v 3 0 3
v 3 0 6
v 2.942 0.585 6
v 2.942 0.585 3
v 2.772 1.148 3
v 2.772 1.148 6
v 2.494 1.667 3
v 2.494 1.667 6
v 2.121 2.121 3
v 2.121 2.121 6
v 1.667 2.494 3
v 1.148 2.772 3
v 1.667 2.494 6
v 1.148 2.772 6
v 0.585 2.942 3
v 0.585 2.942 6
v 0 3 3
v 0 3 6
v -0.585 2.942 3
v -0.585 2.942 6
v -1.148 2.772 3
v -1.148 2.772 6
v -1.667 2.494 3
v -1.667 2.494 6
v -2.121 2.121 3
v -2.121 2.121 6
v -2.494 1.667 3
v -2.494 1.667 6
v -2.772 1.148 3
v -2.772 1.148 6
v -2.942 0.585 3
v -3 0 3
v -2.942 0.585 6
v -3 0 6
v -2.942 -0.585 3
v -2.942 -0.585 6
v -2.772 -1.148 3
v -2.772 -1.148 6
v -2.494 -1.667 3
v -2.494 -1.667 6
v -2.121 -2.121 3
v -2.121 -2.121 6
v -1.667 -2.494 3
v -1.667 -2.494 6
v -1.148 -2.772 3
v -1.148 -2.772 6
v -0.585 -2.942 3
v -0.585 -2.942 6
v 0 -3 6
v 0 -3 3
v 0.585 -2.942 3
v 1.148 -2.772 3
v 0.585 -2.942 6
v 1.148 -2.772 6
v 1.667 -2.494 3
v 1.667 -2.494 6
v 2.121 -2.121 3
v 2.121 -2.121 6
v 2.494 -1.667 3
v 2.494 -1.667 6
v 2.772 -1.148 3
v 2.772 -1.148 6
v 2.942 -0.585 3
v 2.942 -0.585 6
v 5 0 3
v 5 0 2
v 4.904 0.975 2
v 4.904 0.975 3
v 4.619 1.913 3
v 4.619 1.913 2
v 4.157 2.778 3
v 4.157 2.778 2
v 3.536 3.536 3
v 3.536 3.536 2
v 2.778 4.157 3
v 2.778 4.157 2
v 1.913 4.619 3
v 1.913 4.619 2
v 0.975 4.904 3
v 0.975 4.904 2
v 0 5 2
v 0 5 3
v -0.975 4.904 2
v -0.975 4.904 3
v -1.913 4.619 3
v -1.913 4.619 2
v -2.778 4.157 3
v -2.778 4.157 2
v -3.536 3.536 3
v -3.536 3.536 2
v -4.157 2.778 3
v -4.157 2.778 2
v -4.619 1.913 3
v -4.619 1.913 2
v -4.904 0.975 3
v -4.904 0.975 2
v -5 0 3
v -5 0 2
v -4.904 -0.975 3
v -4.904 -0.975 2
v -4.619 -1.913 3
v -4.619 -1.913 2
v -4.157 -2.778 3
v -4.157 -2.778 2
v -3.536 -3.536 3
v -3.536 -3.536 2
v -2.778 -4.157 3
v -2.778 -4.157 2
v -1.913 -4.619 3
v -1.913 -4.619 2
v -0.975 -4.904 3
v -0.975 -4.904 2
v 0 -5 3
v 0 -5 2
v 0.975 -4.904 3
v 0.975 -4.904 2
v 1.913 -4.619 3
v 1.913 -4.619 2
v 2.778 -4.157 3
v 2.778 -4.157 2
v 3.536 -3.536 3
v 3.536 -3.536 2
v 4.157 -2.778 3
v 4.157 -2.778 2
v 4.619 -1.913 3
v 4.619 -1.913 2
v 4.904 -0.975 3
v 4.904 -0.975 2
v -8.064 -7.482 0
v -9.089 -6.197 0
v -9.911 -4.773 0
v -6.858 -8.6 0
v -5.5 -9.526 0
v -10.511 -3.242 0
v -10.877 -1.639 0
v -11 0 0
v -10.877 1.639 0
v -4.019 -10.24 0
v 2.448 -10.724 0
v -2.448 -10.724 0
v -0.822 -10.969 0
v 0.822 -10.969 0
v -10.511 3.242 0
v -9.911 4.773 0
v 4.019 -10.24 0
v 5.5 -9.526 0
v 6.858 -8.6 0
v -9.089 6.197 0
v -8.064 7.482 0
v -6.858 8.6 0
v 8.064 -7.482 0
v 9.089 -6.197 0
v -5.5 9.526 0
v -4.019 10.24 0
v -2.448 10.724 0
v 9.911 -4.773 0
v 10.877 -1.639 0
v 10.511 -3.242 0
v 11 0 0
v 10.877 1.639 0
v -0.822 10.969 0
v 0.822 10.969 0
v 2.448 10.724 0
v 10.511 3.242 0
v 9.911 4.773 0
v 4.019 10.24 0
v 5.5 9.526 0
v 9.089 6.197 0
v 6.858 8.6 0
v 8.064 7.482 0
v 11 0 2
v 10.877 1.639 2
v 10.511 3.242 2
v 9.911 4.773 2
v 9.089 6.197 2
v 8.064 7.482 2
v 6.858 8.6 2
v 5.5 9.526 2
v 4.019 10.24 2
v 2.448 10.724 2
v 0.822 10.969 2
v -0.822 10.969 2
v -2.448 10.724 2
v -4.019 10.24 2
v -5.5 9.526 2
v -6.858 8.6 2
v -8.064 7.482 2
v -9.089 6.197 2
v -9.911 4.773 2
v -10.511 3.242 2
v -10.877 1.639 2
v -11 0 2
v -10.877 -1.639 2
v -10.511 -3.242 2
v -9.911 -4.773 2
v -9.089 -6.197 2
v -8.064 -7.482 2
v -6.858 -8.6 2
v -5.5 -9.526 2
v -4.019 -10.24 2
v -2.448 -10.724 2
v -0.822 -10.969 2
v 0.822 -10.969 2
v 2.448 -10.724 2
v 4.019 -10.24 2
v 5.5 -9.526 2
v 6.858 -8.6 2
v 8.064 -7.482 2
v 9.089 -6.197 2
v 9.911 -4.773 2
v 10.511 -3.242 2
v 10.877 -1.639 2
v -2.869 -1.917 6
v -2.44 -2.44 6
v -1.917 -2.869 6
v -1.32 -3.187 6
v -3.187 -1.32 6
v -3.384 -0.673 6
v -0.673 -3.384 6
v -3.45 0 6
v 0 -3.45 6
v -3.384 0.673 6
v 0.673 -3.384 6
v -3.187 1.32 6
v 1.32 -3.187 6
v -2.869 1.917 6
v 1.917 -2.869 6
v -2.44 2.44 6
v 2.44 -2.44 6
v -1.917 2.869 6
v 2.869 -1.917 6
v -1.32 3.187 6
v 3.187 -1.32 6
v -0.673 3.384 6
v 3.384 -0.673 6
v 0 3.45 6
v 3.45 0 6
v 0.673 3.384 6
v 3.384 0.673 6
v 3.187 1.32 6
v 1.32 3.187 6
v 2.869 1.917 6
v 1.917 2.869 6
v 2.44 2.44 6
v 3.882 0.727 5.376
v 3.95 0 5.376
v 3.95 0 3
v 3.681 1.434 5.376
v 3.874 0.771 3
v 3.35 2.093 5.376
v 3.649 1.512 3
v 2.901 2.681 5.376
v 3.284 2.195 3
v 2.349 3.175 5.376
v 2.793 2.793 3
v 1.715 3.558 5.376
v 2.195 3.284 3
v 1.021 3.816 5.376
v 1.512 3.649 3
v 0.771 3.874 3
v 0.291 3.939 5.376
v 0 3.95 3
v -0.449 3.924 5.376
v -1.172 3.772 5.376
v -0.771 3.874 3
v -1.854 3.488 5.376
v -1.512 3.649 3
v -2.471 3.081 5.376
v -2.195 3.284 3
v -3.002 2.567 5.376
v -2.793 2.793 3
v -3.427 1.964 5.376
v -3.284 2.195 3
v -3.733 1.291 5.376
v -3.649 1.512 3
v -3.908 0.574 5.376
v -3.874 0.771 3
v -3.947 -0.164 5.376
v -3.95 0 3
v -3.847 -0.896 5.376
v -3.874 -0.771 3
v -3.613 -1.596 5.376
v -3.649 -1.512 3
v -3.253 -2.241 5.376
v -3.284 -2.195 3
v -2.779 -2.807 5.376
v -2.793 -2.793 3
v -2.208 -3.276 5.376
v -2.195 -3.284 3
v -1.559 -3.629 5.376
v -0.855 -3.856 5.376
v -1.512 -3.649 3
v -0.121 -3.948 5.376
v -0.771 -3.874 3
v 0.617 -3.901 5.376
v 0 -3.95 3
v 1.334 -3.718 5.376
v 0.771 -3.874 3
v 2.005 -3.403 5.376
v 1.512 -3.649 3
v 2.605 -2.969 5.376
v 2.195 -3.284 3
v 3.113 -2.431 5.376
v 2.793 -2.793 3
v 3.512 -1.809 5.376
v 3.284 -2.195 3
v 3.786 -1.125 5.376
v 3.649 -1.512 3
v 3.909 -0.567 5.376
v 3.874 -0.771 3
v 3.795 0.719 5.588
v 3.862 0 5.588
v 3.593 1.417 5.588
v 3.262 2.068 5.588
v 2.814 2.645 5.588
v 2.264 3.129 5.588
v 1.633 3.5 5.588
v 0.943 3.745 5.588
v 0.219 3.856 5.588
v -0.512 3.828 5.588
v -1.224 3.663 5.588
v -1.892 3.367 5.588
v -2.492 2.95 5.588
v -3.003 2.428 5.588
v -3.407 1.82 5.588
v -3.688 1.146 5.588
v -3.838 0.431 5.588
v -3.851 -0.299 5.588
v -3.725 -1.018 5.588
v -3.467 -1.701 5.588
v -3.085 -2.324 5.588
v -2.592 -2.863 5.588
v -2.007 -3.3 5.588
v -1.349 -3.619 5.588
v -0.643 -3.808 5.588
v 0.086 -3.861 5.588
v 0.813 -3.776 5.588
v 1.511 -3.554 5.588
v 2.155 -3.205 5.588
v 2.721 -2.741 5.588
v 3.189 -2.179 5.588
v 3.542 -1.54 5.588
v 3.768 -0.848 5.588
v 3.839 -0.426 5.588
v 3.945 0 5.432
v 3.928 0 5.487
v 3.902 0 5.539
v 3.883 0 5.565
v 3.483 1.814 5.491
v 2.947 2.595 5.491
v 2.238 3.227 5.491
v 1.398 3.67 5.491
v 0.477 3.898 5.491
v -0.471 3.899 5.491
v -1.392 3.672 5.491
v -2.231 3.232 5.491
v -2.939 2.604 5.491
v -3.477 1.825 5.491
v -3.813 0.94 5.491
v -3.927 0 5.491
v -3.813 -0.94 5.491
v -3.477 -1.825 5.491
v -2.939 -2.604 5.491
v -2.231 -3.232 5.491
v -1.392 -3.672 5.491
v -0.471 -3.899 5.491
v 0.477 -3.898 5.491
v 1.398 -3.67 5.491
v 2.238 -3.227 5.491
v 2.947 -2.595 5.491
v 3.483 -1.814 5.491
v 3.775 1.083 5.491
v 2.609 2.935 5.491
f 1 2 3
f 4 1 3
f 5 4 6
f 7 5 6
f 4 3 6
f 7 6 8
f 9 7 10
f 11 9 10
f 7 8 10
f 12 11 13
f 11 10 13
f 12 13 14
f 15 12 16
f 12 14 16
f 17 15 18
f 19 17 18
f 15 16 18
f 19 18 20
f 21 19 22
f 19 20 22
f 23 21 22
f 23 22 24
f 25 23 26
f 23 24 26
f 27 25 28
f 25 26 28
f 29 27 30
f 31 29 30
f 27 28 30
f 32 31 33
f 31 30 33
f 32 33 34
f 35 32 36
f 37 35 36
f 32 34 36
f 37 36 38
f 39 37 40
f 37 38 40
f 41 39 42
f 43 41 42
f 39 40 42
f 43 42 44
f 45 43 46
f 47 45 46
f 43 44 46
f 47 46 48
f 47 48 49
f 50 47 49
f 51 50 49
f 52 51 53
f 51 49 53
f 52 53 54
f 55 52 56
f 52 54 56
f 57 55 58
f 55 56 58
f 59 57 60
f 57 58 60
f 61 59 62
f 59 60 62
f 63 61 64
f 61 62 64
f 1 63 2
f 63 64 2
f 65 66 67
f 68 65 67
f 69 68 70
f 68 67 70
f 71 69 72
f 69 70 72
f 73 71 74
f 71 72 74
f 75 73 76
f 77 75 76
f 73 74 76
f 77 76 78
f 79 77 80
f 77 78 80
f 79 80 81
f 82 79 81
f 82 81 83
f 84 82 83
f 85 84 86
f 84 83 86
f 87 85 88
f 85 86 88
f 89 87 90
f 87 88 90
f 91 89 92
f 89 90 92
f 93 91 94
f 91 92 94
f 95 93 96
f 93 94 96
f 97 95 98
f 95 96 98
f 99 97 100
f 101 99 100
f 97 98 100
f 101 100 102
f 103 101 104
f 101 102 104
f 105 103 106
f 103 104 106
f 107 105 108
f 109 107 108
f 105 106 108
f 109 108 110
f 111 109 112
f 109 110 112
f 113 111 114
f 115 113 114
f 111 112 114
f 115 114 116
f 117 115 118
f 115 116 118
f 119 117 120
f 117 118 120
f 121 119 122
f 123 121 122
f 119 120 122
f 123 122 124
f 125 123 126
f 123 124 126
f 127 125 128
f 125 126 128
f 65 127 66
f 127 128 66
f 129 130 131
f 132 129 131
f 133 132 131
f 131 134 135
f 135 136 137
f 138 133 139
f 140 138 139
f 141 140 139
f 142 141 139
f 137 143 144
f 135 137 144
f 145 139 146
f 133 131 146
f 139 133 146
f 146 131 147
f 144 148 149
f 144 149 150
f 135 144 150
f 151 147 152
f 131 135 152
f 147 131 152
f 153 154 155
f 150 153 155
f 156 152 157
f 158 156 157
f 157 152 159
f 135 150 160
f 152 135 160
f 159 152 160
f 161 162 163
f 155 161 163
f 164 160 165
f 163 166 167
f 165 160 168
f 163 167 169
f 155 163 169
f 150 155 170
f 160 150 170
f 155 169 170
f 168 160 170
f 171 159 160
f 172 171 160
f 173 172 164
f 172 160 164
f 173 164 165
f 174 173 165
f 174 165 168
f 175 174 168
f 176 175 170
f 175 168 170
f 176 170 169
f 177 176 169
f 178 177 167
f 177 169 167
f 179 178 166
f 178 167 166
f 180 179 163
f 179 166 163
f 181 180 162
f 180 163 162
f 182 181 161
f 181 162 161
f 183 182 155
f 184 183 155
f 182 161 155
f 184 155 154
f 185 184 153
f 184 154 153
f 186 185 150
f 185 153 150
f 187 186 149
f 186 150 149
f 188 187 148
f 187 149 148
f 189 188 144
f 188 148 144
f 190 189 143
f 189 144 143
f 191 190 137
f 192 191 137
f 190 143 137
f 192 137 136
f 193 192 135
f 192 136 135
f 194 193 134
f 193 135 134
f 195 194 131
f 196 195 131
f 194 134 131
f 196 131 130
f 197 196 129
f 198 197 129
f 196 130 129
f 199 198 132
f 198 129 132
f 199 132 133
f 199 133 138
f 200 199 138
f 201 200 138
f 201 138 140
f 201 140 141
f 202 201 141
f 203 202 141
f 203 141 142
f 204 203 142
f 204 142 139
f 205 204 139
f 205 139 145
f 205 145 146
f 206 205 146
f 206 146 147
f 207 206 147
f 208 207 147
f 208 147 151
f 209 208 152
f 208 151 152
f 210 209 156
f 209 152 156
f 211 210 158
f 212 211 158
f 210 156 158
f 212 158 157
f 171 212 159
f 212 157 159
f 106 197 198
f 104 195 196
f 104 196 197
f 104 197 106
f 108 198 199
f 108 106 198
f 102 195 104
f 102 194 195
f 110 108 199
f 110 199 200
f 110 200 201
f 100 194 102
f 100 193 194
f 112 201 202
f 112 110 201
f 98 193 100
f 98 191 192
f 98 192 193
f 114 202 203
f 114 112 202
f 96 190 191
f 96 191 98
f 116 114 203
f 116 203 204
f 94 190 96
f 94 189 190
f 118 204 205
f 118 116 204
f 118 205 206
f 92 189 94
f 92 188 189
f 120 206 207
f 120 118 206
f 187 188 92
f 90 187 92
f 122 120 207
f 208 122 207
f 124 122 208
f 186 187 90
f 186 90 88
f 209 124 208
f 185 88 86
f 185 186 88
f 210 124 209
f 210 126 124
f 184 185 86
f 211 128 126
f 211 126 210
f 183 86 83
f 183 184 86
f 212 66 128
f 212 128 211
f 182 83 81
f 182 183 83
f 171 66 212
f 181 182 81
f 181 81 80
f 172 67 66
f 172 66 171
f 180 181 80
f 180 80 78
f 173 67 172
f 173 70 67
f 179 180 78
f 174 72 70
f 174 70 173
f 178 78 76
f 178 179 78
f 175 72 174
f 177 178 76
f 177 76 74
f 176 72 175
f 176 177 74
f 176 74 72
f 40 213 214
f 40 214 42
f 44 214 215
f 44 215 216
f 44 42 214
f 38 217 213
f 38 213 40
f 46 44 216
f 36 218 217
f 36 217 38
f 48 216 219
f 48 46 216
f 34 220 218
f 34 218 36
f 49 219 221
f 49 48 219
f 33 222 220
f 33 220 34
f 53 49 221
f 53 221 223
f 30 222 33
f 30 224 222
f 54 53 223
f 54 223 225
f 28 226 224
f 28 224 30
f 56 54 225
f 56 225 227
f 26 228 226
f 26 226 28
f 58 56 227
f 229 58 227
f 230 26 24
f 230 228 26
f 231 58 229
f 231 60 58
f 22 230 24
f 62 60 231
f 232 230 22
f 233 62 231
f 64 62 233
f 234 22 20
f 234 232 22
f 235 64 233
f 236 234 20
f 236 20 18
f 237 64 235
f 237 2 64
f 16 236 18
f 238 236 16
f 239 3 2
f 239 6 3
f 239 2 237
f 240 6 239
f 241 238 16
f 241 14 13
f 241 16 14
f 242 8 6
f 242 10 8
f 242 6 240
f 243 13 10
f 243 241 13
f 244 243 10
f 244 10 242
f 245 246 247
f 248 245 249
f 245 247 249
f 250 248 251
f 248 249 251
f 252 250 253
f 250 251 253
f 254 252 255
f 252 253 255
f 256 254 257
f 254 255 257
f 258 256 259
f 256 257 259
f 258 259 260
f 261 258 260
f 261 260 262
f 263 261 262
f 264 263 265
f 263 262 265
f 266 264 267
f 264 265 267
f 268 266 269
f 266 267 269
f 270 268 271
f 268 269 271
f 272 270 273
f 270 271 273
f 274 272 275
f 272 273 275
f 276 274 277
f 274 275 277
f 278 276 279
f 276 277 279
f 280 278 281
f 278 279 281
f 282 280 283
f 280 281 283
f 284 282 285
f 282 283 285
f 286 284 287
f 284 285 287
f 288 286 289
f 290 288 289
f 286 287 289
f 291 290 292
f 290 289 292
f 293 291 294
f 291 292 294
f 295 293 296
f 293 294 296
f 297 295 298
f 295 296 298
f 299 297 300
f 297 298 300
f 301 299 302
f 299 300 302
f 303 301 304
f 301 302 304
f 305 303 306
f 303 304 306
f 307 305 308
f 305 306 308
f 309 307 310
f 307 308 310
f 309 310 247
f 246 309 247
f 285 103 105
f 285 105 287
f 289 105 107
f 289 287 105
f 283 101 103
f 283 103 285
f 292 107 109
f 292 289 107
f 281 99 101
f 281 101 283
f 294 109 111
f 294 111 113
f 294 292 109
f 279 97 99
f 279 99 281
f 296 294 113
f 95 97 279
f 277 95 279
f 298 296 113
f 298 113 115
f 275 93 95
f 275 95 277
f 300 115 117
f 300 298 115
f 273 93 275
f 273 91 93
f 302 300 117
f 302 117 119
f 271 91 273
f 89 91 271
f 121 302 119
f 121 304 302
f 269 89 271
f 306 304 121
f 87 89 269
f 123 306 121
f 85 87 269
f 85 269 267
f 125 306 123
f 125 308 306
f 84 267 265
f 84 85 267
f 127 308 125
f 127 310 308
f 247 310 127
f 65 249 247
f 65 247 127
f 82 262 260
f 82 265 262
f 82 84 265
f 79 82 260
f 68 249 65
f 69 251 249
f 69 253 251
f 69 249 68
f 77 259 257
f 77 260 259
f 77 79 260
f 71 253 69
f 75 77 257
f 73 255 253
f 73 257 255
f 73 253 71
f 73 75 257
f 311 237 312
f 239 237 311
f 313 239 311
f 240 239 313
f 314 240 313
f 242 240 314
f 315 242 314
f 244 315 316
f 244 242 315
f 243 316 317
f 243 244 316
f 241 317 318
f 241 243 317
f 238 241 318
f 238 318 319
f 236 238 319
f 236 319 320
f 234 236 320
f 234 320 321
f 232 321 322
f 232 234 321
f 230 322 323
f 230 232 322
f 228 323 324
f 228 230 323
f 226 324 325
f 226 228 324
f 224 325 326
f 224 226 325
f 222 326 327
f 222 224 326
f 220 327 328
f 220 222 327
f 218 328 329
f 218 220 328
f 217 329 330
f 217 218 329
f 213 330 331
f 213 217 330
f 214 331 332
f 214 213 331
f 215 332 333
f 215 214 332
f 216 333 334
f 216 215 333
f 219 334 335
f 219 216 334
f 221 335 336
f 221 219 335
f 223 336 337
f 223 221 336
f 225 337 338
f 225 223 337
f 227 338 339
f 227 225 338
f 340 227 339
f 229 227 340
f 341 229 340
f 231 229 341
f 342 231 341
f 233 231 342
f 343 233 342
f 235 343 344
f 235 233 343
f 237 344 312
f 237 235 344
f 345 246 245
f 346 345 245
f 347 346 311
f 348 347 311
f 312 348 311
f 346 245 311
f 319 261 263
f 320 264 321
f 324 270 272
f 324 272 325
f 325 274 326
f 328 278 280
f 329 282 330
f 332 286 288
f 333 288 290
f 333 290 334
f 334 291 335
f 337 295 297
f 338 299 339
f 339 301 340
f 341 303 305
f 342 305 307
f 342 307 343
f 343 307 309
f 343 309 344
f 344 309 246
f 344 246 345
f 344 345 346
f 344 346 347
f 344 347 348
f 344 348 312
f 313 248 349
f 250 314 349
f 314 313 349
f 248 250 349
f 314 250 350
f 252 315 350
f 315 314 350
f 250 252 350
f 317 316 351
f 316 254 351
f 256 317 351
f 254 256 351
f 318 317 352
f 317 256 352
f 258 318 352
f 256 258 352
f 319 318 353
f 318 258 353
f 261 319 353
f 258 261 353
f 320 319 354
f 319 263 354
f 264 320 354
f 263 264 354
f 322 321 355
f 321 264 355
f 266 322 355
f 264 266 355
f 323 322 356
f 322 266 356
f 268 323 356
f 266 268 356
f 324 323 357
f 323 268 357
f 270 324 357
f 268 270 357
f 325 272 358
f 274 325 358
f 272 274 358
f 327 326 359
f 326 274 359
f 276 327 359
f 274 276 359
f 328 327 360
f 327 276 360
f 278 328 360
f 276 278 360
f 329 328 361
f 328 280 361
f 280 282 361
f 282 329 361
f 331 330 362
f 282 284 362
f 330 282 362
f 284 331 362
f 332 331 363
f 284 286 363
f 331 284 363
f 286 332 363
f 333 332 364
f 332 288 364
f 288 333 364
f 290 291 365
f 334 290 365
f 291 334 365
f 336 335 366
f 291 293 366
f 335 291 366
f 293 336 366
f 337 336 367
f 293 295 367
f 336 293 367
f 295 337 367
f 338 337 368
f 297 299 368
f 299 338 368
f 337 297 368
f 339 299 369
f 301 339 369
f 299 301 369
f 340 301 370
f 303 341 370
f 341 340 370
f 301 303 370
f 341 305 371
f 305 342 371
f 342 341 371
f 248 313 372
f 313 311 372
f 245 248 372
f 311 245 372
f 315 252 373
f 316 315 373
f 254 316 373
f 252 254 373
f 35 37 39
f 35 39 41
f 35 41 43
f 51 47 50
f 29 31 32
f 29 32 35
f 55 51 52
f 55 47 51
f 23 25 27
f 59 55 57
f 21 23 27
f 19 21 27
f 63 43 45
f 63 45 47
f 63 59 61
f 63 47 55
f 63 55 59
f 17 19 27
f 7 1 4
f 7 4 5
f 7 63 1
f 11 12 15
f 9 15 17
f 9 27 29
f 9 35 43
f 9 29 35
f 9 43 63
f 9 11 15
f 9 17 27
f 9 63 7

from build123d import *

# Parameters (mm, degrees)
F0_R     = 11
F1_DEPTH = 2
F2_R     = 5
F3_DEPTH = 1
F4_R     = 3.95
F5_DEPTH = 3
F6_R     = 3
F7_DEPTH = 3
F8_SIZE  = 0.5
F9_R     = 0.3


with BuildPart() as f1:
    # F0 (on Top) → F1 (new body)
    with BuildSketch(Plane.XY):
        Circle(F0_R)
    extrude(amount=F1_DEPTH)

    # F2 (on face) → F3 (join)
    with BuildSketch(Plane.XY.offset(2)):
        Circle(F2_R)
    extrude(amount=F3_DEPTH)

    # F4 (on face) → F5 (join)
    with BuildSketch(Plane.XY.offset(3)):
        Circle(F4_R)
    extrude(amount=F5_DEPTH)

    # F6 (on face) → F7 (cut)
    with BuildSketch(Plane.XY.offset(6)):
        Circle(F6_R)
    extrude(amount=-F7_DEPTH, mode=Mode.SUBTRACT)

    # F8
    f8_edges = [f1.edges().sort_by_distance(p)[0] for p in [
        (-3.95, 0, 6),
    ]]
    chamfer(f8_edges, length=F8_SIZE)

    # F9
    f9_edges = [f1.edges().sort_by_distance(p)[0] for p in [
        (-3.95, 0, 5.5),
    ]]
    fillet(f9_edges, radius=F9_R)


solid = f1.part
